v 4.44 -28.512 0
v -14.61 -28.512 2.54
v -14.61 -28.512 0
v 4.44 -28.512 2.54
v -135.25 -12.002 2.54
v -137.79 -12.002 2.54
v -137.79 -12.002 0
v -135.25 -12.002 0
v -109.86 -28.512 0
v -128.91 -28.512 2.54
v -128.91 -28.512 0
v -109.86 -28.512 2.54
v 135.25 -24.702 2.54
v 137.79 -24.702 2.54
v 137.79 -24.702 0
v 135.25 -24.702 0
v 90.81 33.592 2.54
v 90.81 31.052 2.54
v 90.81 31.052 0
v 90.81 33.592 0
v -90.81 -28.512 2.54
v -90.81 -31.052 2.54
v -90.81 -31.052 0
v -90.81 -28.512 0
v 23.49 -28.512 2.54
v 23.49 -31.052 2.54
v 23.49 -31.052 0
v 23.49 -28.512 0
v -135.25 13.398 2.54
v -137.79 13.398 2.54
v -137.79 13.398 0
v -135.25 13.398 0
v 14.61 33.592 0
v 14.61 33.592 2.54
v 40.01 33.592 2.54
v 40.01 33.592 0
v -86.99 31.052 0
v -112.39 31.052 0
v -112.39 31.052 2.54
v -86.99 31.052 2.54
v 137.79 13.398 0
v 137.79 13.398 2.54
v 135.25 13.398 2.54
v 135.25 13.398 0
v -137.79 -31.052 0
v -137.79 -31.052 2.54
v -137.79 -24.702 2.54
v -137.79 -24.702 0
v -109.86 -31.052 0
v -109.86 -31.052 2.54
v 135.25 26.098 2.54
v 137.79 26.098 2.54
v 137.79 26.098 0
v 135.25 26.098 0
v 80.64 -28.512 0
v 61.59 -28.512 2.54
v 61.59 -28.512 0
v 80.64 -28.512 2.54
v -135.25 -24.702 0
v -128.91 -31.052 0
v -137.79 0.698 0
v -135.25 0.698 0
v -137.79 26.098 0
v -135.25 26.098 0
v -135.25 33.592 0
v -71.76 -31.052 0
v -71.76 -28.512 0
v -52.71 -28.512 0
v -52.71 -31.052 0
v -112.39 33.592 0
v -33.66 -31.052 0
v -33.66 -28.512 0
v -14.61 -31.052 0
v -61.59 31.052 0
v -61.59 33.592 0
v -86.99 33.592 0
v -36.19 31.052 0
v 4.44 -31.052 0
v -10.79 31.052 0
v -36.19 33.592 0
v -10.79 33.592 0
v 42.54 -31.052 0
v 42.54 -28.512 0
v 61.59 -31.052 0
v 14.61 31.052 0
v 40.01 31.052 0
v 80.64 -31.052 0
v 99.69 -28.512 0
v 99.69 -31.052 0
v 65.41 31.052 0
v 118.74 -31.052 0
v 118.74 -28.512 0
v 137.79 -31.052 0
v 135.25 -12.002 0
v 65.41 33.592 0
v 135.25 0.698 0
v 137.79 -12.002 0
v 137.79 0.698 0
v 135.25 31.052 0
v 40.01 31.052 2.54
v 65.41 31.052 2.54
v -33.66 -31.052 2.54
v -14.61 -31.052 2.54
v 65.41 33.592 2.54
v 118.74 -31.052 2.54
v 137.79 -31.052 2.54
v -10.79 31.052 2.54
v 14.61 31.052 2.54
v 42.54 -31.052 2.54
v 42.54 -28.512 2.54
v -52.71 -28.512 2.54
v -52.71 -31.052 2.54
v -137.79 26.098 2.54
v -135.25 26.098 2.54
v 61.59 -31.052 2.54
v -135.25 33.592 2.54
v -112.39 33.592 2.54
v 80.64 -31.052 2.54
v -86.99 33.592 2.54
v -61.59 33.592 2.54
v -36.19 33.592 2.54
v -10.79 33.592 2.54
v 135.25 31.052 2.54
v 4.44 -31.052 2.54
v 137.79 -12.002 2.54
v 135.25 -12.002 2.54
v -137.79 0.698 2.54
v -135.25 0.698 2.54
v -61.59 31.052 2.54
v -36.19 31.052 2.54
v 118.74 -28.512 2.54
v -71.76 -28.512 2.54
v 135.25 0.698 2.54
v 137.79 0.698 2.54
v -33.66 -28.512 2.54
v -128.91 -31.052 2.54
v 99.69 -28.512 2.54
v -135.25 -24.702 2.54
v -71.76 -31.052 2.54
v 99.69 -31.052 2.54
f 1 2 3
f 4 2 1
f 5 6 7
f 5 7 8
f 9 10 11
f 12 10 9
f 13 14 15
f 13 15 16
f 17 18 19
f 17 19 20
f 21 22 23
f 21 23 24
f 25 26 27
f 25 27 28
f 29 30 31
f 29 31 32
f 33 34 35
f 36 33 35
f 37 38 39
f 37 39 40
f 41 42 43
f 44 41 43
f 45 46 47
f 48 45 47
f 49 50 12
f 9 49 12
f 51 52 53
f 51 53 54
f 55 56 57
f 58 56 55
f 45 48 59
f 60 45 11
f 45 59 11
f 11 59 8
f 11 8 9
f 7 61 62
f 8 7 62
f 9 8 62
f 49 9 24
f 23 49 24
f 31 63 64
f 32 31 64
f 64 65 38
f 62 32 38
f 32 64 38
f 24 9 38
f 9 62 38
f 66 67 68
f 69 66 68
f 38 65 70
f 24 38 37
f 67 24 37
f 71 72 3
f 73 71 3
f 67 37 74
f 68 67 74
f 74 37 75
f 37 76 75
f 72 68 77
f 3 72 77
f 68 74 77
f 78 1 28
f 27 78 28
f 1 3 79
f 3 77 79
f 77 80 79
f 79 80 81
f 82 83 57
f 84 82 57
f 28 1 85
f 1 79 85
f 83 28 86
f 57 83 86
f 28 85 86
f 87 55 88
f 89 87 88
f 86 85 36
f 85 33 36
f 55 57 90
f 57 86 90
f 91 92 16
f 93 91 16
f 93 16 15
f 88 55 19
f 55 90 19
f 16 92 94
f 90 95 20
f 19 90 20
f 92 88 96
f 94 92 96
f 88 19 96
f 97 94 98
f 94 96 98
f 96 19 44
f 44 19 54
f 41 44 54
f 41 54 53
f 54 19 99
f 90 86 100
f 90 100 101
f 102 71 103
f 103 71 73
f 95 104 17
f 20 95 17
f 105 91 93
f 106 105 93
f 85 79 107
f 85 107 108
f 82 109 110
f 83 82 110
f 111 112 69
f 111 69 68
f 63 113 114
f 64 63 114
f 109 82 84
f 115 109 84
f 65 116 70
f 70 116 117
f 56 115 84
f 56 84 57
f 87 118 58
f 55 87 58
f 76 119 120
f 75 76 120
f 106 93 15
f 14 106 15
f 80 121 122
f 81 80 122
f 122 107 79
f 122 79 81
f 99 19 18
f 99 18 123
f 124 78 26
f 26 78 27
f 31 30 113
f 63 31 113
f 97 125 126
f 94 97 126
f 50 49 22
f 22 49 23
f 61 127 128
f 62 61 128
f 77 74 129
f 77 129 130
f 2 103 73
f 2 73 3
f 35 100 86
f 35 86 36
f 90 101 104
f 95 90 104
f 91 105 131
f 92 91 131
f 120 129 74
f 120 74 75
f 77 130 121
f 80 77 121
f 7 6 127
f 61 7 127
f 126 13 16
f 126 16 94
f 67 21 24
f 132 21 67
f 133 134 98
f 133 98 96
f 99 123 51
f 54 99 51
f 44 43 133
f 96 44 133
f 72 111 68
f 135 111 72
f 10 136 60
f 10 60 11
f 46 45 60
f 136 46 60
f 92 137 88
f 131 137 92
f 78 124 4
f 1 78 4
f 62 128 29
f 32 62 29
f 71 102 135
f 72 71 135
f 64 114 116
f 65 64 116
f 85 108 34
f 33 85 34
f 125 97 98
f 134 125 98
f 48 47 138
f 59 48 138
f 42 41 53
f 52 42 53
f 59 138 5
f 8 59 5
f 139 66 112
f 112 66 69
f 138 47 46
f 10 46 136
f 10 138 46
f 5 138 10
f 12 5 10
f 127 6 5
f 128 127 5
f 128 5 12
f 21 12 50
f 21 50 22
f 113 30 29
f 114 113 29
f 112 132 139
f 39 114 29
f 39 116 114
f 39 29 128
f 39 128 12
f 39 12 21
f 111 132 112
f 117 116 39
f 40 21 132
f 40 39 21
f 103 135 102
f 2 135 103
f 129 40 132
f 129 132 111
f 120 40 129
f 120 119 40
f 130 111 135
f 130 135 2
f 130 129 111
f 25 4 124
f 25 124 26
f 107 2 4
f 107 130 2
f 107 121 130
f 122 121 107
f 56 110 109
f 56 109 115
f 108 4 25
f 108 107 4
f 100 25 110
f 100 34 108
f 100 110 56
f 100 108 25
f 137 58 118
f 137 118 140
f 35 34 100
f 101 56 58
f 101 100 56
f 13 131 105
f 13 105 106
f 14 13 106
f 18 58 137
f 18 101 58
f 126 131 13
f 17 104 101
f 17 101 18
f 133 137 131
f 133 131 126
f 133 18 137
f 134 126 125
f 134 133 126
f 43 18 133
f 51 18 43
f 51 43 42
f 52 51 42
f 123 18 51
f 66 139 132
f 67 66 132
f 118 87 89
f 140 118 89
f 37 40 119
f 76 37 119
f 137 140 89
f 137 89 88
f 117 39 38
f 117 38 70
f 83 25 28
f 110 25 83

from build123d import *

# Parameters (mm, degrees)
SKETCH1_W               = 275.57984
SKETCH1_H               = 62.103
BOSS_EXTRUDE1_DEPTH     = 2.54
SKETCH2_W               = 25.4
SKETCH2_H               = 2.54
BOSS_EXTRUDE2_DEPTH     = 2.54
LPATTERN1_COUNT         = 5
LPATTERN1_PITCH         = 50.8
SKETCH3_W               = 2.54
SKETCH3_H               = 12.7
CUT_EXTRUDE1_DEPTH      = 142.848167157
LPATTERN3_COUNT         = 3
LPATTERN3_PITCH         = 25.4
MIRROR1_COPY_1_SKETCH_W = 2.54
MIRROR1_COPY_1_SKETCH_H = 12.7
MIRROR1_COPY_1_DEPTH    = 142.848167157
MIRROR1_COPY_2_SKETCH_W = 2.54
MIRROR1_COPY_2_SKETCH_H = 12.7
MIRROR1_COPY_2_DEPTH    = 142.848167157
SKETCH5_W               = 19.05
SKETCH5_H               = 2.54
CUT_EXTRUDE3_DEPTH      = 142.848167157
LPATTERN5_COUNT         = 8
LPATTERN5_PITCH         = 38.1


with BuildPart() as part:
    # Sketch1 → Boss-Extrude1 (new body)
    with BuildSketch(Plane.XY):
        Rectangle(SKETCH1_W, SKETCH1_H)
    extrude(amount=BOSS_EXTRUDE1_DEPTH)

    # Sketch2 → Boss-Extrude2 (add)
    with BuildSketch(Plane.XY.offset(2.54)):
        with Locations((-125.08992, 32.3215)):
            Rectangle(SKETCH2_W, SKETCH2_H)
    boss_extrude2 = extrude(amount=-BOSS_EXTRUDE2_DEPTH)

    # LPattern1: Boss-Extrude2 ×5
    with Locations(*[(i * LPATTERN1_PITCH, 0, 0) for i in range(1, LPATTERN1_COUNT)]):
        add(boss_extrude2)

    # Sketch3 → Cut-Extrude1 (cut, through all)
    with BuildSketch(Plane.XY.offset(2.54)):
        with Locations((-136.51992, -18.3515)):
            Rectangle(SKETCH3_W, SKETCH3_H)
    cut_extrude1 = extrude(amount=-CUT_EXTRUDE1_DEPTH, mode=Mode.SUBTRACT)

    # LPattern3: Cut-Extrude1 ×3
    with Locations(*[(0, i * LPATTERN3_PITCH, 0) for i in range(1, LPATTERN3_COUNT)]):
        add(cut_extrude1, mode=Mode.SUBTRACT)

    # Mirror1: Cut-Extrude1 across plane
    add(cut_extrude1.mirror(Plane(origin=(0, 0, 0), x_dir=(0, 0, 1), z_dir=(1, 0, 0))), mode=Mode.SUBTRACT)

    # Mirror1 copy 1 sketch → Mirror1 copy 1 (cut, through all)
    with BuildSketch(Plane(origin=(0, 25.4, 2.54), x_dir=(-1, 0, 0), z_dir=(0, 0, 1))):
        with Locations((-136.51992, 18.3515)):
            Rectangle(MIRROR1_COPY_1_SKETCH_W, MIRROR1_COPY_1_SKETCH_H)
    extrude(amount=-MIRROR1_COPY_1_DEPTH, mode=Mode.SUBTRACT)

    # Mirror1 copy 2 sketch → Mirror1 copy 2 (cut, through all)
    with BuildSketch(Plane(origin=(0, 50.8, 2.54), x_dir=(-1, 0, 0), z_dir=(0, 0, 1))):
        with Locations((-136.51992, 18.3515)):
            Rectangle(MIRROR1_COPY_2_SKETCH_W, MIRROR1_COPY_2_SKETCH_H)
    extrude(amount=-MIRROR1_COPY_2_DEPTH, mode=Mode.SUBTRACT)

    # Sketch5 → Cut-Extrude3 (cut, through all)
    with BuildSketch(Plane.XY.offset(2.54)):
        with Locations((-119.38508, -29.7815)):
            Rectangle(SKETCH5_W, SKETCH5_H)
    cut_extrude3 = extrude(amount=-CUT_EXTRUDE3_DEPTH, mode=Mode.SUBTRACT)

    # LPattern5: Cut-Extrude3 ×8
    with Locations(*[(i * LPATTERN5_PITCH, 0, 0) for i in range(1, LPATTERN5_COUNT)]):
        add(cut_extrude3, mode=Mode.SUBTRACT)


solid = part.part
